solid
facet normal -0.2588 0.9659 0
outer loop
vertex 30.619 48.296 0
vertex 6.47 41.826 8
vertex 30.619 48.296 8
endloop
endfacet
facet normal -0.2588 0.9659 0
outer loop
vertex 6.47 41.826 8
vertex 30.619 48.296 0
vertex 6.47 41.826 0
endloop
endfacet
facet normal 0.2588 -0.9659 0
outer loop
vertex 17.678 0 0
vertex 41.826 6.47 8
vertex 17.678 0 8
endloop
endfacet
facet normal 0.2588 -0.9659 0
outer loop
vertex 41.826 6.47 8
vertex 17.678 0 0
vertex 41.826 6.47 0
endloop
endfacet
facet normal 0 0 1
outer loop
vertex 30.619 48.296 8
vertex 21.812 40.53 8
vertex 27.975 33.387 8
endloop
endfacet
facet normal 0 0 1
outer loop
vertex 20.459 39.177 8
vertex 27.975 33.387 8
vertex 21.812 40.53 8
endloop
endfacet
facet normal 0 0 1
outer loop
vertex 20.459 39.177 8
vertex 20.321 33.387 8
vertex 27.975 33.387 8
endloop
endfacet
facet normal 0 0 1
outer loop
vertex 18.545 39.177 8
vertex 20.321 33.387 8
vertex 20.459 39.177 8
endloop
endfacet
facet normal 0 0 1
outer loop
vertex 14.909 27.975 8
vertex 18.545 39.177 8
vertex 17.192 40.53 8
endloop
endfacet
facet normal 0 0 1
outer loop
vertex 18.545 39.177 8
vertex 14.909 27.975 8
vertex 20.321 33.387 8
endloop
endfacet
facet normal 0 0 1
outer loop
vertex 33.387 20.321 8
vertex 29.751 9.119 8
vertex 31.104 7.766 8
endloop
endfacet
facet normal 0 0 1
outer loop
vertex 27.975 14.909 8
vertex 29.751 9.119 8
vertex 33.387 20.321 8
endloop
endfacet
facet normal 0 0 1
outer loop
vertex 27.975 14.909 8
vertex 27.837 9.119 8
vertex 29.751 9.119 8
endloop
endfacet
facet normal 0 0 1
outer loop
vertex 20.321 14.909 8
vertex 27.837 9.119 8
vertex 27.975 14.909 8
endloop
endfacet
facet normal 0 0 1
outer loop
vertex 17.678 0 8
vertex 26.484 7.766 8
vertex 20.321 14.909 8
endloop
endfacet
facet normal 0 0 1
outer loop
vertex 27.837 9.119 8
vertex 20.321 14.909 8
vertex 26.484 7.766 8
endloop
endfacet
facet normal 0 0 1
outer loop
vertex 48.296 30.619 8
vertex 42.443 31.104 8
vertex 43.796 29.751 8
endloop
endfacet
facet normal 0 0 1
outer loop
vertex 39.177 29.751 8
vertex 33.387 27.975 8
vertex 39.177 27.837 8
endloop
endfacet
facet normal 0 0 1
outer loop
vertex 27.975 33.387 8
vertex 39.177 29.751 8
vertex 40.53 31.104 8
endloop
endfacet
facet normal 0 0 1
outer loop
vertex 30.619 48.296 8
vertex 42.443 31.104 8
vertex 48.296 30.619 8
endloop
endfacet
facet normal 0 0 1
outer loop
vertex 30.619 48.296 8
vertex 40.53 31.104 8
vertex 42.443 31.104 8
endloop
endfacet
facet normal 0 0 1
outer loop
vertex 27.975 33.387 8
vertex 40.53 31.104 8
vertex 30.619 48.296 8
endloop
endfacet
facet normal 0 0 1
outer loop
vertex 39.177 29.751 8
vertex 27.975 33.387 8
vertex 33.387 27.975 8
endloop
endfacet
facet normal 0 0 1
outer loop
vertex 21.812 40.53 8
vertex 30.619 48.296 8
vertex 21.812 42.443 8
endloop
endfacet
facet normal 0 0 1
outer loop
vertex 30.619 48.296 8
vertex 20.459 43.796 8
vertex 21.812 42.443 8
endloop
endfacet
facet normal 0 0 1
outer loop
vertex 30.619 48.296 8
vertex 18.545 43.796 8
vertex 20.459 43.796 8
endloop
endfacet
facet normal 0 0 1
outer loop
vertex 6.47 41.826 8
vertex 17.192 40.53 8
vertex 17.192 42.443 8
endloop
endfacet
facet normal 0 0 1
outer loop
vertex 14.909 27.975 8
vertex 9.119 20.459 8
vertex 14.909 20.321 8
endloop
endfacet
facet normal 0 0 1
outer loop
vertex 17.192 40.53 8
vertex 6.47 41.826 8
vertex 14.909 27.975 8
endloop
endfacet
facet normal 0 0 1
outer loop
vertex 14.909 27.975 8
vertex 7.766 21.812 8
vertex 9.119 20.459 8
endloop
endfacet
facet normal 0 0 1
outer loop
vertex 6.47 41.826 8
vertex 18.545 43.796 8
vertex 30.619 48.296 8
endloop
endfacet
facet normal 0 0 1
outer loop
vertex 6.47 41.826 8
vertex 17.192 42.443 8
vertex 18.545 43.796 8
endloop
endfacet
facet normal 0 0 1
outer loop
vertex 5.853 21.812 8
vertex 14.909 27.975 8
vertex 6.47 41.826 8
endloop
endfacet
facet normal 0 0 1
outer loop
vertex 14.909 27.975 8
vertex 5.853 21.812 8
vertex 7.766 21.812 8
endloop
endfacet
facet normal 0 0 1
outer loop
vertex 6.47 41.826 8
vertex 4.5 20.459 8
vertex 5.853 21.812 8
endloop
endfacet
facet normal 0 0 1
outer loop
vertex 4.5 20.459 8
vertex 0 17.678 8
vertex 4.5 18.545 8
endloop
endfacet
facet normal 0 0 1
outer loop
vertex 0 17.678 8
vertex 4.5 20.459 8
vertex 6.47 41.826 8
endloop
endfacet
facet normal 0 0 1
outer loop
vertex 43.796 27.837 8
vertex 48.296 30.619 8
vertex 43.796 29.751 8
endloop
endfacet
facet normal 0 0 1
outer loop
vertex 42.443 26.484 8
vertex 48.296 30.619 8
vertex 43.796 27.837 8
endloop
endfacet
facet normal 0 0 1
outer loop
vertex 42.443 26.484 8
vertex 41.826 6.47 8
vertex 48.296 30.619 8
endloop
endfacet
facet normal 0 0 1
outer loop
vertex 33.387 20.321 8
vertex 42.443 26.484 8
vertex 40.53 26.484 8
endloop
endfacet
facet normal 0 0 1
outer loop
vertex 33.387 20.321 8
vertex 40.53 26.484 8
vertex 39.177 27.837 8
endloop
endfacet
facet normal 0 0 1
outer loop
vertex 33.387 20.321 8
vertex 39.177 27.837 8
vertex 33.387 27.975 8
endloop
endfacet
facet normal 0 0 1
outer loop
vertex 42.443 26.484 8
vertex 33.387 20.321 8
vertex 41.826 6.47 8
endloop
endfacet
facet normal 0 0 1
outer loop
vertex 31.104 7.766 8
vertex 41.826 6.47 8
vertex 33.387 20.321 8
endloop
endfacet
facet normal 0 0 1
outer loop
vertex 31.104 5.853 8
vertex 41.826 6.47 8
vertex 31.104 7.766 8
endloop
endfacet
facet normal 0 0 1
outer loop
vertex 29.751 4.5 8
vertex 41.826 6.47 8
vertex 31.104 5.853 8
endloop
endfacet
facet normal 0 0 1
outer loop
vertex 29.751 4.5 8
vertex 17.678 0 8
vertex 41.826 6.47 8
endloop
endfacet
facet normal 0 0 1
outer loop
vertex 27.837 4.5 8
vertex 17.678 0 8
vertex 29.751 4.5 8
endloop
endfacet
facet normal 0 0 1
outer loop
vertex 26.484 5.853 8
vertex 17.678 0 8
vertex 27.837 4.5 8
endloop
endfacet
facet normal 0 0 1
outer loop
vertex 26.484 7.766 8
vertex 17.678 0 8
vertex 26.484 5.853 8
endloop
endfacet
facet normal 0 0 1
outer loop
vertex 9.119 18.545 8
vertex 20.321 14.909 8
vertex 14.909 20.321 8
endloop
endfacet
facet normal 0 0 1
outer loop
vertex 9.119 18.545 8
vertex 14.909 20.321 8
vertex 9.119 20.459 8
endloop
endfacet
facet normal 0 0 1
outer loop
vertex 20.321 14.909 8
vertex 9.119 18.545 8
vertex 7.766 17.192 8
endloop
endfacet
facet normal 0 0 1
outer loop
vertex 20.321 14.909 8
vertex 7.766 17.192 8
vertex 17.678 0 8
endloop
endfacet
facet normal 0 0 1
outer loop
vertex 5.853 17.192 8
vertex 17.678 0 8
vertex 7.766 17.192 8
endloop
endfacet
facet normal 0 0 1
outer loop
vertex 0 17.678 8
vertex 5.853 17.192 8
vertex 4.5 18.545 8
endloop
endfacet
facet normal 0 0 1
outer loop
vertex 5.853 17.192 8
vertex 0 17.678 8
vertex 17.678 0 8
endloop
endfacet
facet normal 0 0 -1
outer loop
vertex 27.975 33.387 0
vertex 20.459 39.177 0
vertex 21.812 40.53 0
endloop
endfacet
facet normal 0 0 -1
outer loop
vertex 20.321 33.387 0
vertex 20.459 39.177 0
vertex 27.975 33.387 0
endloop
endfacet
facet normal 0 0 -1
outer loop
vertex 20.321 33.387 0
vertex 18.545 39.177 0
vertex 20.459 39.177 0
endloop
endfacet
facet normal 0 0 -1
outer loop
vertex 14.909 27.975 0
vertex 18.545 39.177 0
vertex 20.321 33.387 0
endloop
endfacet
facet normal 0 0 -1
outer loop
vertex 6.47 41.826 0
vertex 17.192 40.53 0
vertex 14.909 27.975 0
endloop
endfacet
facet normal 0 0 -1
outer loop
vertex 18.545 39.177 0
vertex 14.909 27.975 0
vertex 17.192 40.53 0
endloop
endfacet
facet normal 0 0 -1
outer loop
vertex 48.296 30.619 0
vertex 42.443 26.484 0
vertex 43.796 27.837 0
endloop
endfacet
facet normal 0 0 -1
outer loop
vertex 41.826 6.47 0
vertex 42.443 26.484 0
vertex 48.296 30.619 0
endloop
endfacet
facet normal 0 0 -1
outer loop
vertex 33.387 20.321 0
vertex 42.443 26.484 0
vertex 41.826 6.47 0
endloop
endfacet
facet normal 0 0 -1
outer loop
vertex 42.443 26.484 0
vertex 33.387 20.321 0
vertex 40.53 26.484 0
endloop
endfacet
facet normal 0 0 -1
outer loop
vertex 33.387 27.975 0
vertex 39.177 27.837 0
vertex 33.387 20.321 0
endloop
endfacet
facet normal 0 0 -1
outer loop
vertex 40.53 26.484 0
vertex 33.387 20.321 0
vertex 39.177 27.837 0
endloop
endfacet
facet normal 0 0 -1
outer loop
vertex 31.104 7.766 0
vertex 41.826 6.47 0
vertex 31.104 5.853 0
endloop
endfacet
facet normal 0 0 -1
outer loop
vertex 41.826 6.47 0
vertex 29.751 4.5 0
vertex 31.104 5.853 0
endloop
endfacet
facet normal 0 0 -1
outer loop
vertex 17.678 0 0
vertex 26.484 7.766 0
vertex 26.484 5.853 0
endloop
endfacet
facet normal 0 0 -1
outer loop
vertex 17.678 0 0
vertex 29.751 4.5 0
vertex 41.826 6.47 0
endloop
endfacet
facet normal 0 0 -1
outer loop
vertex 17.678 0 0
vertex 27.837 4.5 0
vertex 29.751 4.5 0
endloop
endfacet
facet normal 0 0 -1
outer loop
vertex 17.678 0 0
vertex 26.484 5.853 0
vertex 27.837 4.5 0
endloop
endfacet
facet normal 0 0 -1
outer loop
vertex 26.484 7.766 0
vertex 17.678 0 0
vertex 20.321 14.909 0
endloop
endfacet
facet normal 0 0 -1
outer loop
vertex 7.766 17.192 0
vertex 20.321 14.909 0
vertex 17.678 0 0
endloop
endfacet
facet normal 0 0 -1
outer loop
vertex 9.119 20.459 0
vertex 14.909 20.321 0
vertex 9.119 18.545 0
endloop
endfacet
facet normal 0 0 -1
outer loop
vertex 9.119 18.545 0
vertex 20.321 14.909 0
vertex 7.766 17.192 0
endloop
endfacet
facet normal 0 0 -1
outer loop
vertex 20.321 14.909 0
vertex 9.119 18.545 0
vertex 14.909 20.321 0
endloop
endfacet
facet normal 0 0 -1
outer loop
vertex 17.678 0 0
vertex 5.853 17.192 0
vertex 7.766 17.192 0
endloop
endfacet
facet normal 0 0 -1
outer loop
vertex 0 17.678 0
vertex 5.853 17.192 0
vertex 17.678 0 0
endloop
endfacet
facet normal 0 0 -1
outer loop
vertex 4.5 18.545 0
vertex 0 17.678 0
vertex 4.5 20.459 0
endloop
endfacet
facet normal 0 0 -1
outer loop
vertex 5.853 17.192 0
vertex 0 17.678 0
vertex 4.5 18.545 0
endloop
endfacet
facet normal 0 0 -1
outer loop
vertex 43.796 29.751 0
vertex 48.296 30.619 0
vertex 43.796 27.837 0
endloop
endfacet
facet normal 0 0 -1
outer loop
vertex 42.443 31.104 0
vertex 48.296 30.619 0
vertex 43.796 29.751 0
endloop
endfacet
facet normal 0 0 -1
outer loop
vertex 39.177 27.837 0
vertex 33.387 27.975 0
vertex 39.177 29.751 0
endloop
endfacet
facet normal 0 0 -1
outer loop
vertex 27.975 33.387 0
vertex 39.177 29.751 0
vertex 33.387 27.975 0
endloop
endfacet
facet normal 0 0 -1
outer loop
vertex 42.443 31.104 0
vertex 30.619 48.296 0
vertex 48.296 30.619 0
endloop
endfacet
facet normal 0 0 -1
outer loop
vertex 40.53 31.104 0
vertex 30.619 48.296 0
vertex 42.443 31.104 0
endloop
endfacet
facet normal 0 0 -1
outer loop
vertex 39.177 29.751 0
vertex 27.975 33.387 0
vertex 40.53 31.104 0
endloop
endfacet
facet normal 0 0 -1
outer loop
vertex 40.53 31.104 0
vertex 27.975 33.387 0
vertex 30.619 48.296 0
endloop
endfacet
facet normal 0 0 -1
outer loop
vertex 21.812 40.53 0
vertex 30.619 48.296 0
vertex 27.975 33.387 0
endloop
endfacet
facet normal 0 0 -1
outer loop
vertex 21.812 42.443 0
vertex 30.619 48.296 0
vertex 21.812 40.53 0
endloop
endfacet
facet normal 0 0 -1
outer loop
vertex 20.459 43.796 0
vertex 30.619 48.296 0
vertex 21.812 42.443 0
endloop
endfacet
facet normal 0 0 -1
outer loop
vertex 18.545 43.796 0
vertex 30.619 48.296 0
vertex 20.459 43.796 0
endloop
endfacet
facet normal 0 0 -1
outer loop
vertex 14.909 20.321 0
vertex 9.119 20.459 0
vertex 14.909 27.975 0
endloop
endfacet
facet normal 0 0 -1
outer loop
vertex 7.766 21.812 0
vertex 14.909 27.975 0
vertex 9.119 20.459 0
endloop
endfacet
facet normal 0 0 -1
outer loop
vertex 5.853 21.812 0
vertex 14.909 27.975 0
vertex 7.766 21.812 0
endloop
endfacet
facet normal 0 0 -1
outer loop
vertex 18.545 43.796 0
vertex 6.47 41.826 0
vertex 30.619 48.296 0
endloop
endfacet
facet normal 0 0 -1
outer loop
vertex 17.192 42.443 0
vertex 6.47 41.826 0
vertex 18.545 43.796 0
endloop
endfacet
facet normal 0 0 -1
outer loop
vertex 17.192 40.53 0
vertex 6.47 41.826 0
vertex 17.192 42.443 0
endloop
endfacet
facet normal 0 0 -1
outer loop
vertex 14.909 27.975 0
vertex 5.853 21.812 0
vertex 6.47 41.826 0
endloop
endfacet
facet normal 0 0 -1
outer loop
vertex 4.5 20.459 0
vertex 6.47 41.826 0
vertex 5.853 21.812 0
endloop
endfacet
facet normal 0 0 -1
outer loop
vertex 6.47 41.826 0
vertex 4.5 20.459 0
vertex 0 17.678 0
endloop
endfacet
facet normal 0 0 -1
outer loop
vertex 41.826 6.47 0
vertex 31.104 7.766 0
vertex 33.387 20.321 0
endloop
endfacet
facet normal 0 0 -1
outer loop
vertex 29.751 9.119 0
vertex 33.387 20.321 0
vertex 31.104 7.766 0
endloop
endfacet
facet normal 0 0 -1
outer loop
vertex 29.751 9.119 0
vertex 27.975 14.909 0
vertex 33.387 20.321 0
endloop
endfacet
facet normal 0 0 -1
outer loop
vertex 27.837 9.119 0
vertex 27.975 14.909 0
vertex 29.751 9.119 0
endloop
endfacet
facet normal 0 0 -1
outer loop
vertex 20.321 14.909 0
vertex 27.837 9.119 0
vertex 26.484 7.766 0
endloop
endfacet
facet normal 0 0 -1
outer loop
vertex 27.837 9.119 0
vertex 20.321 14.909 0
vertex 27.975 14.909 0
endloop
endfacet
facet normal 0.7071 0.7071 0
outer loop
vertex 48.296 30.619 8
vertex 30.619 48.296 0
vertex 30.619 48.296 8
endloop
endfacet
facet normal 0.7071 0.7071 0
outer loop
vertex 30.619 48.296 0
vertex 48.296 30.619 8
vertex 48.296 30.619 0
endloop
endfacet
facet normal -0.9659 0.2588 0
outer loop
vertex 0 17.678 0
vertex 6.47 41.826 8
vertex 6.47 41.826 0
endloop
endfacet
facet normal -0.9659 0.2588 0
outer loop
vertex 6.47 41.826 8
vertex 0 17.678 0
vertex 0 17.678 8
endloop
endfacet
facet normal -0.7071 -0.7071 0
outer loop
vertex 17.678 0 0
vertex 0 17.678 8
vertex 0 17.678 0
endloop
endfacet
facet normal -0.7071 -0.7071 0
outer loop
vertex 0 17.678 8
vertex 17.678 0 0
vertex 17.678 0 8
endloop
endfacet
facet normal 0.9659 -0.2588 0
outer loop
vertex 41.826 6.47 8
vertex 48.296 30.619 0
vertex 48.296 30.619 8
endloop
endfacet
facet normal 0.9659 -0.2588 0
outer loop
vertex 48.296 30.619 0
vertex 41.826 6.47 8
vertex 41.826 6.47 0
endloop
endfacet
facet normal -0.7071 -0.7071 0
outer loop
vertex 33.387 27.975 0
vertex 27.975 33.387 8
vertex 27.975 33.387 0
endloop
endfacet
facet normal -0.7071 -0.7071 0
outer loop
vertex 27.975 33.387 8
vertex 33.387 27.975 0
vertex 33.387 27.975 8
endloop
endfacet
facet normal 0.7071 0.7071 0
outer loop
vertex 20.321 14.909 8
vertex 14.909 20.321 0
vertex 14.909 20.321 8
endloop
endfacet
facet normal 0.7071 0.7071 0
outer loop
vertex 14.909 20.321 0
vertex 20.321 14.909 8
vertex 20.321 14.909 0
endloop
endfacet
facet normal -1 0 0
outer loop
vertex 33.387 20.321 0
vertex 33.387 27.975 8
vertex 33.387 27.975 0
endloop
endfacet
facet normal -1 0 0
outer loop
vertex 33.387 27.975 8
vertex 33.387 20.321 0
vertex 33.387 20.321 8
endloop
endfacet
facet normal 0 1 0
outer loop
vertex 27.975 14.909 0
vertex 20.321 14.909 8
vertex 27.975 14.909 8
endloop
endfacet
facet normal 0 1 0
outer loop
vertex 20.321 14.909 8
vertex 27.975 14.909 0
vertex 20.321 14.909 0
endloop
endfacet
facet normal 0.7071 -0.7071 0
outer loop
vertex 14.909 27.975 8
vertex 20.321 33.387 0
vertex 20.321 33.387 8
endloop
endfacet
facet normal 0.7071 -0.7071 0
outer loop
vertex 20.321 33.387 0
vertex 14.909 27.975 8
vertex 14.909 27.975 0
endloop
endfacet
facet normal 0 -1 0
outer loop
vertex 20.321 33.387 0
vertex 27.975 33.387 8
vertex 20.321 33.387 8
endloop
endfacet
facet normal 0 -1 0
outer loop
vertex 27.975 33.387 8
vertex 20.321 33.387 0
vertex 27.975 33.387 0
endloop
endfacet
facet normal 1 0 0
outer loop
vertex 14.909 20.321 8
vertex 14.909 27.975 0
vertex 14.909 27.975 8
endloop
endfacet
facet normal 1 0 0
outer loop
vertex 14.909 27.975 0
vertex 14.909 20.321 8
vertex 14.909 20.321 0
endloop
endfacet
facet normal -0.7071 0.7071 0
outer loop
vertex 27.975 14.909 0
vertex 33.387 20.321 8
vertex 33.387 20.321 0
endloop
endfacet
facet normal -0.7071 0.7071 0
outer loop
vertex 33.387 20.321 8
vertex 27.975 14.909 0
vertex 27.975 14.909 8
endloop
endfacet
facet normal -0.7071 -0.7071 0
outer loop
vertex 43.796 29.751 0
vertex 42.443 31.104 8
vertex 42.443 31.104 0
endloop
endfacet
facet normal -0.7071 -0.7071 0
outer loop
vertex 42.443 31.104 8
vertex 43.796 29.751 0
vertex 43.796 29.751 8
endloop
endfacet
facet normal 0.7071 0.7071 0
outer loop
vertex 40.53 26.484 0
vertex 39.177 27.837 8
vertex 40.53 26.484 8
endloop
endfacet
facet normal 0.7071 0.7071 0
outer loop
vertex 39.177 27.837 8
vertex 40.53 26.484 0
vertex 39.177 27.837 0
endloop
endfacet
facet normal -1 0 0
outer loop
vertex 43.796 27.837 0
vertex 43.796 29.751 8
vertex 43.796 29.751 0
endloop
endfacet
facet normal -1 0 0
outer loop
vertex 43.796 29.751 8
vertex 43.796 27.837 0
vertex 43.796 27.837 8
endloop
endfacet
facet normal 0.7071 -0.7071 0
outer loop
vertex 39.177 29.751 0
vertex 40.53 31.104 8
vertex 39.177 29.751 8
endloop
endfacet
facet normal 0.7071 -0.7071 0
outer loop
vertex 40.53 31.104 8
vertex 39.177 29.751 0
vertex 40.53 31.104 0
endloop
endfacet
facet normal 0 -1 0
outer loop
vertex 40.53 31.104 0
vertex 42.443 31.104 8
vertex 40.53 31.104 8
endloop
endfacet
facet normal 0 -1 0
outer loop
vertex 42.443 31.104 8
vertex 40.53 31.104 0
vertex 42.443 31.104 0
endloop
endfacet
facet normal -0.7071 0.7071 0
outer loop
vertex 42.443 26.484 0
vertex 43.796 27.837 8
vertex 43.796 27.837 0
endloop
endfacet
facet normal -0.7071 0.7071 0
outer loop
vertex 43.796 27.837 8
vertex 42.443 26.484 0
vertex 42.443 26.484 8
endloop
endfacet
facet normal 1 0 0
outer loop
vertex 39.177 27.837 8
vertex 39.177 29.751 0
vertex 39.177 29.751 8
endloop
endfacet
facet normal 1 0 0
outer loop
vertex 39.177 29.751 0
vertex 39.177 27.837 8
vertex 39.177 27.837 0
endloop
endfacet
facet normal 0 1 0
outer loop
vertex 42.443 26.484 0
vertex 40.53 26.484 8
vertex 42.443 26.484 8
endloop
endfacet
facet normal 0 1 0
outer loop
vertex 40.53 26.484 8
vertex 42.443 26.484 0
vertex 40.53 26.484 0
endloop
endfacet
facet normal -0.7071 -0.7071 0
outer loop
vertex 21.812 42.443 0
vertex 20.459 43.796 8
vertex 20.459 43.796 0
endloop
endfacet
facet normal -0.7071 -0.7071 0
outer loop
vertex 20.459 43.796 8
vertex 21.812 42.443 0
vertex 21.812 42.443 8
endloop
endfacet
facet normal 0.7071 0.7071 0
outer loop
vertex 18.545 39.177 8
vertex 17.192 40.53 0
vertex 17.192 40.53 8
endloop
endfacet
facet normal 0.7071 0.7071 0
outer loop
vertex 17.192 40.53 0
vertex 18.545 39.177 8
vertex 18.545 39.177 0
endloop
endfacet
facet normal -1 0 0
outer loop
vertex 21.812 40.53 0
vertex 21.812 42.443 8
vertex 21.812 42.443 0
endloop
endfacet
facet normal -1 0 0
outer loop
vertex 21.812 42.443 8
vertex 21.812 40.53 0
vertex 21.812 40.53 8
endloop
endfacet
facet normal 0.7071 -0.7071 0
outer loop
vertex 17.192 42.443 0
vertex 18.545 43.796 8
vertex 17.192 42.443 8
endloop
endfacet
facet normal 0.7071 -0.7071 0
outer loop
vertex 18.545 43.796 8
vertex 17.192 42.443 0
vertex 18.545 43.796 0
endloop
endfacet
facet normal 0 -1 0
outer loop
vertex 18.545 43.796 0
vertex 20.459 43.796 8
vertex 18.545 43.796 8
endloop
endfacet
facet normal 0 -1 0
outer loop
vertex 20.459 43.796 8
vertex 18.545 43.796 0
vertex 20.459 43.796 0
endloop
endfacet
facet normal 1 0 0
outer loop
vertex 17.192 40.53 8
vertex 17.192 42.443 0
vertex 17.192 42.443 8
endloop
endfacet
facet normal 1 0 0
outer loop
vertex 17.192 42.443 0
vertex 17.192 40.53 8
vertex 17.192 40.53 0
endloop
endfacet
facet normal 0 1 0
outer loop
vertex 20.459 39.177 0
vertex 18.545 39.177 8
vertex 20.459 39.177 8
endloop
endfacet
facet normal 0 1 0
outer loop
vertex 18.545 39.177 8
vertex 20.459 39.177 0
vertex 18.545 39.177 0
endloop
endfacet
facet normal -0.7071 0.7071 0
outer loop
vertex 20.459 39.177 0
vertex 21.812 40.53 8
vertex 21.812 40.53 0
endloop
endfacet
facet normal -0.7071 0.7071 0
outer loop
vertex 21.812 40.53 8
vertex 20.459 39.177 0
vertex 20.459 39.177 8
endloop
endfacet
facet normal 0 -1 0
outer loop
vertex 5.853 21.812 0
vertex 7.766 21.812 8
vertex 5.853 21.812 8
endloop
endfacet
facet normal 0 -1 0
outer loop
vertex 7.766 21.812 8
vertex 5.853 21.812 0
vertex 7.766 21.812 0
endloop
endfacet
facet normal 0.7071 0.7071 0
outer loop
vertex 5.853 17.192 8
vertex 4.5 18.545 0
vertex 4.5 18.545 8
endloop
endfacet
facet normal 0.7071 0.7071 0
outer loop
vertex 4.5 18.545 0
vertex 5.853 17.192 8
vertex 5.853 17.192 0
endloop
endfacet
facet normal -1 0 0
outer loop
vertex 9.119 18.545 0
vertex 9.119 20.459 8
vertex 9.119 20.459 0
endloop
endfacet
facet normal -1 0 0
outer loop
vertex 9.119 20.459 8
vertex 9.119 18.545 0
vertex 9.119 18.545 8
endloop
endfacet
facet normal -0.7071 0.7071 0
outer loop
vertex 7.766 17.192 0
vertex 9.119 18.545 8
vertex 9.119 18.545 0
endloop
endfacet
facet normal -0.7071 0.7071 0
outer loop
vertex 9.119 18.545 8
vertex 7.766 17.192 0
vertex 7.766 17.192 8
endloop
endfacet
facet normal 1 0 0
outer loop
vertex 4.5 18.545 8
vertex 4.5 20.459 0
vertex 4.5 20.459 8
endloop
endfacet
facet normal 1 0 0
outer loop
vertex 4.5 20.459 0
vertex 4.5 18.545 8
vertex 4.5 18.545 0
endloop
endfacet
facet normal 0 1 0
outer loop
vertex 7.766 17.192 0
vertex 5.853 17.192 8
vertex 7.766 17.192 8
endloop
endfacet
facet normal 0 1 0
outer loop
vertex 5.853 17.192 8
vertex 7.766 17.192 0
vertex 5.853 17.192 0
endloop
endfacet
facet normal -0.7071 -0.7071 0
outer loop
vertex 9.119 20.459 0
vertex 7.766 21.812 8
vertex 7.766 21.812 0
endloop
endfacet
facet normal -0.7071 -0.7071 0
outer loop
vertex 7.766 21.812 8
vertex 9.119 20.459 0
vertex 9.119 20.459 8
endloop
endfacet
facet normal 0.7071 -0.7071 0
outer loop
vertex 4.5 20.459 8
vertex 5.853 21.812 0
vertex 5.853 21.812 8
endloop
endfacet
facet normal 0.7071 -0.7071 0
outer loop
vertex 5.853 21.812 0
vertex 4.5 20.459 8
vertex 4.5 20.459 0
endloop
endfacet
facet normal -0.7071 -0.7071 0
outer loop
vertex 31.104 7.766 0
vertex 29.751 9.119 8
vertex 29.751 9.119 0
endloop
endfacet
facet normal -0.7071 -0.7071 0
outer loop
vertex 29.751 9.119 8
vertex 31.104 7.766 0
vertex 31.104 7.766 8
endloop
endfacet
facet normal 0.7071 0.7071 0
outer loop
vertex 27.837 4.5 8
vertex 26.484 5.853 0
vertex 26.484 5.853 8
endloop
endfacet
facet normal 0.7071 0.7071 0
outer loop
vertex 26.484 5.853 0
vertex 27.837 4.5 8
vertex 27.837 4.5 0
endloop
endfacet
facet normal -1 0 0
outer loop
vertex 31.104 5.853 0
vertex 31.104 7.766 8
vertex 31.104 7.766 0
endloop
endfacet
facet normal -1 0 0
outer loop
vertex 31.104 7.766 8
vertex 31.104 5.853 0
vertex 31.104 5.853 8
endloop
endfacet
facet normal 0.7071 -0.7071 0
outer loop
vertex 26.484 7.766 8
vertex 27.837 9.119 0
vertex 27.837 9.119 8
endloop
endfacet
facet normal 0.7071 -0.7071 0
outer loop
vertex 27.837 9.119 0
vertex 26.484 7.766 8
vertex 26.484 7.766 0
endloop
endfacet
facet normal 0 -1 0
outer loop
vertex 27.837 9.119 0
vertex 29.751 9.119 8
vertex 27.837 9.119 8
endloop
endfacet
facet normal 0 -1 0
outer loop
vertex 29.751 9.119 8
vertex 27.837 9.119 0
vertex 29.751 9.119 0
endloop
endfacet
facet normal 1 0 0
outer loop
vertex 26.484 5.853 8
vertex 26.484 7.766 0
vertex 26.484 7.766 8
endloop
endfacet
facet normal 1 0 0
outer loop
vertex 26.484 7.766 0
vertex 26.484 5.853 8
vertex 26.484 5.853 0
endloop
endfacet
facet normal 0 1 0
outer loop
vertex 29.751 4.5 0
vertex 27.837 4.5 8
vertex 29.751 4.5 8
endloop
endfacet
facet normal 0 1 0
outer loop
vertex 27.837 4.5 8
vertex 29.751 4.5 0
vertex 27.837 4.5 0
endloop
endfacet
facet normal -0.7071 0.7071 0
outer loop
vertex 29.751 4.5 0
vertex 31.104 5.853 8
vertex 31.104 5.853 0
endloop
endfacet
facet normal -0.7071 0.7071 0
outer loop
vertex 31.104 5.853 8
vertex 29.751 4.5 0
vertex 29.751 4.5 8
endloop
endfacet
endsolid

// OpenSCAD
$fn = 32;

// ----------------------------------------------------------------------
// Polygon plate: 6-gon R25, 4 bolt windows
// ----------------------------------------------------------------------

// --- parameters (mm) ---
sides = 6;                // number of polygon sides
plate_r = 25;             // circumscribed radius of the polygon
bore_r = 10;              // centre bore radius
bolts = 4;                // number of bolt windows
ring_r = 17.95;           // bolt-circle radius
bolt_r = 2.5;             // bolt window radius
plate_t = 8;              // plate thickness, Z (extrusion height)

plate_d = 2 * plate_r;  // circumscribed diameter
bore_d = 2 * bore_r;  // centre bore diameter
bolt_d = 2 * bolt_r;  // bolt window diameter
ring_d = 2 * ring_r;  // bolt-circle diameter

profile = [[48.296, 30.619], [30.619, 48.296], [6.47, 41.826], [0, 17.678], [17.678, 0], [41.826, 6.47]];  // primary outline, 6 points, counter clockwise
void_1 = [[33.387, 27.975], [27.975, 33.387], [20.321, 33.387], [14.909, 27.975], [14.909, 20.321], [20.321, 14.909], [27.975, 14.909], [33.387, 20.321]];  // centre bore, 8 points
void_2 = [[43.796, 29.751], [42.443, 31.104], [40.53, 31.104], [39.177, 29.751], [39.177, 27.837], [40.53, 26.484], [42.443, 26.484], [43.796, 27.837]];  // bolt window 1, 8 points
void_3 = [[21.812, 42.443], [20.459, 43.796], [18.545, 43.796], [17.192, 42.443], [17.192, 40.53], [18.545, 39.177], [20.459, 39.177], [21.812, 40.53]];  // bolt window 2, 8 points
void_4 = [[9.119, 20.459], [7.766, 21.812], [5.853, 21.812], [4.5, 20.459], [4.5, 18.545], [5.853, 17.192], [7.766, 17.192], [9.119, 18.545]];  // bolt window 3, 8 points
void_5 = [[31.104, 7.766], [29.751, 9.119], [27.837, 9.119], [26.484, 7.766], [26.484, 5.853], [27.837, 4.5], [29.751, 4.5], [31.104, 5.853]];  // bolt window 4, 8 points

// --- the one profile operation ---
difference() {
  linear_extrude(height = plate_t) polygon(points = profile);
  translate([0, 0, -1])
    linear_extrude(height = plate_t + 2) polygon(points = void_1);
  translate([0, 0, -1])
    linear_extrude(height = plate_t + 2) polygon(points = void_2);
  translate([0, 0, -1])
    linear_extrude(height = plate_t + 2) polygon(points = void_3);
  translate([0, 0, -1])
    linear_extrude(height = plate_t + 2) polygon(points = void_4);
  translate([0, 0, -1])
    linear_extrude(height = plate_t + 2) polygon(points = void_5);
}
